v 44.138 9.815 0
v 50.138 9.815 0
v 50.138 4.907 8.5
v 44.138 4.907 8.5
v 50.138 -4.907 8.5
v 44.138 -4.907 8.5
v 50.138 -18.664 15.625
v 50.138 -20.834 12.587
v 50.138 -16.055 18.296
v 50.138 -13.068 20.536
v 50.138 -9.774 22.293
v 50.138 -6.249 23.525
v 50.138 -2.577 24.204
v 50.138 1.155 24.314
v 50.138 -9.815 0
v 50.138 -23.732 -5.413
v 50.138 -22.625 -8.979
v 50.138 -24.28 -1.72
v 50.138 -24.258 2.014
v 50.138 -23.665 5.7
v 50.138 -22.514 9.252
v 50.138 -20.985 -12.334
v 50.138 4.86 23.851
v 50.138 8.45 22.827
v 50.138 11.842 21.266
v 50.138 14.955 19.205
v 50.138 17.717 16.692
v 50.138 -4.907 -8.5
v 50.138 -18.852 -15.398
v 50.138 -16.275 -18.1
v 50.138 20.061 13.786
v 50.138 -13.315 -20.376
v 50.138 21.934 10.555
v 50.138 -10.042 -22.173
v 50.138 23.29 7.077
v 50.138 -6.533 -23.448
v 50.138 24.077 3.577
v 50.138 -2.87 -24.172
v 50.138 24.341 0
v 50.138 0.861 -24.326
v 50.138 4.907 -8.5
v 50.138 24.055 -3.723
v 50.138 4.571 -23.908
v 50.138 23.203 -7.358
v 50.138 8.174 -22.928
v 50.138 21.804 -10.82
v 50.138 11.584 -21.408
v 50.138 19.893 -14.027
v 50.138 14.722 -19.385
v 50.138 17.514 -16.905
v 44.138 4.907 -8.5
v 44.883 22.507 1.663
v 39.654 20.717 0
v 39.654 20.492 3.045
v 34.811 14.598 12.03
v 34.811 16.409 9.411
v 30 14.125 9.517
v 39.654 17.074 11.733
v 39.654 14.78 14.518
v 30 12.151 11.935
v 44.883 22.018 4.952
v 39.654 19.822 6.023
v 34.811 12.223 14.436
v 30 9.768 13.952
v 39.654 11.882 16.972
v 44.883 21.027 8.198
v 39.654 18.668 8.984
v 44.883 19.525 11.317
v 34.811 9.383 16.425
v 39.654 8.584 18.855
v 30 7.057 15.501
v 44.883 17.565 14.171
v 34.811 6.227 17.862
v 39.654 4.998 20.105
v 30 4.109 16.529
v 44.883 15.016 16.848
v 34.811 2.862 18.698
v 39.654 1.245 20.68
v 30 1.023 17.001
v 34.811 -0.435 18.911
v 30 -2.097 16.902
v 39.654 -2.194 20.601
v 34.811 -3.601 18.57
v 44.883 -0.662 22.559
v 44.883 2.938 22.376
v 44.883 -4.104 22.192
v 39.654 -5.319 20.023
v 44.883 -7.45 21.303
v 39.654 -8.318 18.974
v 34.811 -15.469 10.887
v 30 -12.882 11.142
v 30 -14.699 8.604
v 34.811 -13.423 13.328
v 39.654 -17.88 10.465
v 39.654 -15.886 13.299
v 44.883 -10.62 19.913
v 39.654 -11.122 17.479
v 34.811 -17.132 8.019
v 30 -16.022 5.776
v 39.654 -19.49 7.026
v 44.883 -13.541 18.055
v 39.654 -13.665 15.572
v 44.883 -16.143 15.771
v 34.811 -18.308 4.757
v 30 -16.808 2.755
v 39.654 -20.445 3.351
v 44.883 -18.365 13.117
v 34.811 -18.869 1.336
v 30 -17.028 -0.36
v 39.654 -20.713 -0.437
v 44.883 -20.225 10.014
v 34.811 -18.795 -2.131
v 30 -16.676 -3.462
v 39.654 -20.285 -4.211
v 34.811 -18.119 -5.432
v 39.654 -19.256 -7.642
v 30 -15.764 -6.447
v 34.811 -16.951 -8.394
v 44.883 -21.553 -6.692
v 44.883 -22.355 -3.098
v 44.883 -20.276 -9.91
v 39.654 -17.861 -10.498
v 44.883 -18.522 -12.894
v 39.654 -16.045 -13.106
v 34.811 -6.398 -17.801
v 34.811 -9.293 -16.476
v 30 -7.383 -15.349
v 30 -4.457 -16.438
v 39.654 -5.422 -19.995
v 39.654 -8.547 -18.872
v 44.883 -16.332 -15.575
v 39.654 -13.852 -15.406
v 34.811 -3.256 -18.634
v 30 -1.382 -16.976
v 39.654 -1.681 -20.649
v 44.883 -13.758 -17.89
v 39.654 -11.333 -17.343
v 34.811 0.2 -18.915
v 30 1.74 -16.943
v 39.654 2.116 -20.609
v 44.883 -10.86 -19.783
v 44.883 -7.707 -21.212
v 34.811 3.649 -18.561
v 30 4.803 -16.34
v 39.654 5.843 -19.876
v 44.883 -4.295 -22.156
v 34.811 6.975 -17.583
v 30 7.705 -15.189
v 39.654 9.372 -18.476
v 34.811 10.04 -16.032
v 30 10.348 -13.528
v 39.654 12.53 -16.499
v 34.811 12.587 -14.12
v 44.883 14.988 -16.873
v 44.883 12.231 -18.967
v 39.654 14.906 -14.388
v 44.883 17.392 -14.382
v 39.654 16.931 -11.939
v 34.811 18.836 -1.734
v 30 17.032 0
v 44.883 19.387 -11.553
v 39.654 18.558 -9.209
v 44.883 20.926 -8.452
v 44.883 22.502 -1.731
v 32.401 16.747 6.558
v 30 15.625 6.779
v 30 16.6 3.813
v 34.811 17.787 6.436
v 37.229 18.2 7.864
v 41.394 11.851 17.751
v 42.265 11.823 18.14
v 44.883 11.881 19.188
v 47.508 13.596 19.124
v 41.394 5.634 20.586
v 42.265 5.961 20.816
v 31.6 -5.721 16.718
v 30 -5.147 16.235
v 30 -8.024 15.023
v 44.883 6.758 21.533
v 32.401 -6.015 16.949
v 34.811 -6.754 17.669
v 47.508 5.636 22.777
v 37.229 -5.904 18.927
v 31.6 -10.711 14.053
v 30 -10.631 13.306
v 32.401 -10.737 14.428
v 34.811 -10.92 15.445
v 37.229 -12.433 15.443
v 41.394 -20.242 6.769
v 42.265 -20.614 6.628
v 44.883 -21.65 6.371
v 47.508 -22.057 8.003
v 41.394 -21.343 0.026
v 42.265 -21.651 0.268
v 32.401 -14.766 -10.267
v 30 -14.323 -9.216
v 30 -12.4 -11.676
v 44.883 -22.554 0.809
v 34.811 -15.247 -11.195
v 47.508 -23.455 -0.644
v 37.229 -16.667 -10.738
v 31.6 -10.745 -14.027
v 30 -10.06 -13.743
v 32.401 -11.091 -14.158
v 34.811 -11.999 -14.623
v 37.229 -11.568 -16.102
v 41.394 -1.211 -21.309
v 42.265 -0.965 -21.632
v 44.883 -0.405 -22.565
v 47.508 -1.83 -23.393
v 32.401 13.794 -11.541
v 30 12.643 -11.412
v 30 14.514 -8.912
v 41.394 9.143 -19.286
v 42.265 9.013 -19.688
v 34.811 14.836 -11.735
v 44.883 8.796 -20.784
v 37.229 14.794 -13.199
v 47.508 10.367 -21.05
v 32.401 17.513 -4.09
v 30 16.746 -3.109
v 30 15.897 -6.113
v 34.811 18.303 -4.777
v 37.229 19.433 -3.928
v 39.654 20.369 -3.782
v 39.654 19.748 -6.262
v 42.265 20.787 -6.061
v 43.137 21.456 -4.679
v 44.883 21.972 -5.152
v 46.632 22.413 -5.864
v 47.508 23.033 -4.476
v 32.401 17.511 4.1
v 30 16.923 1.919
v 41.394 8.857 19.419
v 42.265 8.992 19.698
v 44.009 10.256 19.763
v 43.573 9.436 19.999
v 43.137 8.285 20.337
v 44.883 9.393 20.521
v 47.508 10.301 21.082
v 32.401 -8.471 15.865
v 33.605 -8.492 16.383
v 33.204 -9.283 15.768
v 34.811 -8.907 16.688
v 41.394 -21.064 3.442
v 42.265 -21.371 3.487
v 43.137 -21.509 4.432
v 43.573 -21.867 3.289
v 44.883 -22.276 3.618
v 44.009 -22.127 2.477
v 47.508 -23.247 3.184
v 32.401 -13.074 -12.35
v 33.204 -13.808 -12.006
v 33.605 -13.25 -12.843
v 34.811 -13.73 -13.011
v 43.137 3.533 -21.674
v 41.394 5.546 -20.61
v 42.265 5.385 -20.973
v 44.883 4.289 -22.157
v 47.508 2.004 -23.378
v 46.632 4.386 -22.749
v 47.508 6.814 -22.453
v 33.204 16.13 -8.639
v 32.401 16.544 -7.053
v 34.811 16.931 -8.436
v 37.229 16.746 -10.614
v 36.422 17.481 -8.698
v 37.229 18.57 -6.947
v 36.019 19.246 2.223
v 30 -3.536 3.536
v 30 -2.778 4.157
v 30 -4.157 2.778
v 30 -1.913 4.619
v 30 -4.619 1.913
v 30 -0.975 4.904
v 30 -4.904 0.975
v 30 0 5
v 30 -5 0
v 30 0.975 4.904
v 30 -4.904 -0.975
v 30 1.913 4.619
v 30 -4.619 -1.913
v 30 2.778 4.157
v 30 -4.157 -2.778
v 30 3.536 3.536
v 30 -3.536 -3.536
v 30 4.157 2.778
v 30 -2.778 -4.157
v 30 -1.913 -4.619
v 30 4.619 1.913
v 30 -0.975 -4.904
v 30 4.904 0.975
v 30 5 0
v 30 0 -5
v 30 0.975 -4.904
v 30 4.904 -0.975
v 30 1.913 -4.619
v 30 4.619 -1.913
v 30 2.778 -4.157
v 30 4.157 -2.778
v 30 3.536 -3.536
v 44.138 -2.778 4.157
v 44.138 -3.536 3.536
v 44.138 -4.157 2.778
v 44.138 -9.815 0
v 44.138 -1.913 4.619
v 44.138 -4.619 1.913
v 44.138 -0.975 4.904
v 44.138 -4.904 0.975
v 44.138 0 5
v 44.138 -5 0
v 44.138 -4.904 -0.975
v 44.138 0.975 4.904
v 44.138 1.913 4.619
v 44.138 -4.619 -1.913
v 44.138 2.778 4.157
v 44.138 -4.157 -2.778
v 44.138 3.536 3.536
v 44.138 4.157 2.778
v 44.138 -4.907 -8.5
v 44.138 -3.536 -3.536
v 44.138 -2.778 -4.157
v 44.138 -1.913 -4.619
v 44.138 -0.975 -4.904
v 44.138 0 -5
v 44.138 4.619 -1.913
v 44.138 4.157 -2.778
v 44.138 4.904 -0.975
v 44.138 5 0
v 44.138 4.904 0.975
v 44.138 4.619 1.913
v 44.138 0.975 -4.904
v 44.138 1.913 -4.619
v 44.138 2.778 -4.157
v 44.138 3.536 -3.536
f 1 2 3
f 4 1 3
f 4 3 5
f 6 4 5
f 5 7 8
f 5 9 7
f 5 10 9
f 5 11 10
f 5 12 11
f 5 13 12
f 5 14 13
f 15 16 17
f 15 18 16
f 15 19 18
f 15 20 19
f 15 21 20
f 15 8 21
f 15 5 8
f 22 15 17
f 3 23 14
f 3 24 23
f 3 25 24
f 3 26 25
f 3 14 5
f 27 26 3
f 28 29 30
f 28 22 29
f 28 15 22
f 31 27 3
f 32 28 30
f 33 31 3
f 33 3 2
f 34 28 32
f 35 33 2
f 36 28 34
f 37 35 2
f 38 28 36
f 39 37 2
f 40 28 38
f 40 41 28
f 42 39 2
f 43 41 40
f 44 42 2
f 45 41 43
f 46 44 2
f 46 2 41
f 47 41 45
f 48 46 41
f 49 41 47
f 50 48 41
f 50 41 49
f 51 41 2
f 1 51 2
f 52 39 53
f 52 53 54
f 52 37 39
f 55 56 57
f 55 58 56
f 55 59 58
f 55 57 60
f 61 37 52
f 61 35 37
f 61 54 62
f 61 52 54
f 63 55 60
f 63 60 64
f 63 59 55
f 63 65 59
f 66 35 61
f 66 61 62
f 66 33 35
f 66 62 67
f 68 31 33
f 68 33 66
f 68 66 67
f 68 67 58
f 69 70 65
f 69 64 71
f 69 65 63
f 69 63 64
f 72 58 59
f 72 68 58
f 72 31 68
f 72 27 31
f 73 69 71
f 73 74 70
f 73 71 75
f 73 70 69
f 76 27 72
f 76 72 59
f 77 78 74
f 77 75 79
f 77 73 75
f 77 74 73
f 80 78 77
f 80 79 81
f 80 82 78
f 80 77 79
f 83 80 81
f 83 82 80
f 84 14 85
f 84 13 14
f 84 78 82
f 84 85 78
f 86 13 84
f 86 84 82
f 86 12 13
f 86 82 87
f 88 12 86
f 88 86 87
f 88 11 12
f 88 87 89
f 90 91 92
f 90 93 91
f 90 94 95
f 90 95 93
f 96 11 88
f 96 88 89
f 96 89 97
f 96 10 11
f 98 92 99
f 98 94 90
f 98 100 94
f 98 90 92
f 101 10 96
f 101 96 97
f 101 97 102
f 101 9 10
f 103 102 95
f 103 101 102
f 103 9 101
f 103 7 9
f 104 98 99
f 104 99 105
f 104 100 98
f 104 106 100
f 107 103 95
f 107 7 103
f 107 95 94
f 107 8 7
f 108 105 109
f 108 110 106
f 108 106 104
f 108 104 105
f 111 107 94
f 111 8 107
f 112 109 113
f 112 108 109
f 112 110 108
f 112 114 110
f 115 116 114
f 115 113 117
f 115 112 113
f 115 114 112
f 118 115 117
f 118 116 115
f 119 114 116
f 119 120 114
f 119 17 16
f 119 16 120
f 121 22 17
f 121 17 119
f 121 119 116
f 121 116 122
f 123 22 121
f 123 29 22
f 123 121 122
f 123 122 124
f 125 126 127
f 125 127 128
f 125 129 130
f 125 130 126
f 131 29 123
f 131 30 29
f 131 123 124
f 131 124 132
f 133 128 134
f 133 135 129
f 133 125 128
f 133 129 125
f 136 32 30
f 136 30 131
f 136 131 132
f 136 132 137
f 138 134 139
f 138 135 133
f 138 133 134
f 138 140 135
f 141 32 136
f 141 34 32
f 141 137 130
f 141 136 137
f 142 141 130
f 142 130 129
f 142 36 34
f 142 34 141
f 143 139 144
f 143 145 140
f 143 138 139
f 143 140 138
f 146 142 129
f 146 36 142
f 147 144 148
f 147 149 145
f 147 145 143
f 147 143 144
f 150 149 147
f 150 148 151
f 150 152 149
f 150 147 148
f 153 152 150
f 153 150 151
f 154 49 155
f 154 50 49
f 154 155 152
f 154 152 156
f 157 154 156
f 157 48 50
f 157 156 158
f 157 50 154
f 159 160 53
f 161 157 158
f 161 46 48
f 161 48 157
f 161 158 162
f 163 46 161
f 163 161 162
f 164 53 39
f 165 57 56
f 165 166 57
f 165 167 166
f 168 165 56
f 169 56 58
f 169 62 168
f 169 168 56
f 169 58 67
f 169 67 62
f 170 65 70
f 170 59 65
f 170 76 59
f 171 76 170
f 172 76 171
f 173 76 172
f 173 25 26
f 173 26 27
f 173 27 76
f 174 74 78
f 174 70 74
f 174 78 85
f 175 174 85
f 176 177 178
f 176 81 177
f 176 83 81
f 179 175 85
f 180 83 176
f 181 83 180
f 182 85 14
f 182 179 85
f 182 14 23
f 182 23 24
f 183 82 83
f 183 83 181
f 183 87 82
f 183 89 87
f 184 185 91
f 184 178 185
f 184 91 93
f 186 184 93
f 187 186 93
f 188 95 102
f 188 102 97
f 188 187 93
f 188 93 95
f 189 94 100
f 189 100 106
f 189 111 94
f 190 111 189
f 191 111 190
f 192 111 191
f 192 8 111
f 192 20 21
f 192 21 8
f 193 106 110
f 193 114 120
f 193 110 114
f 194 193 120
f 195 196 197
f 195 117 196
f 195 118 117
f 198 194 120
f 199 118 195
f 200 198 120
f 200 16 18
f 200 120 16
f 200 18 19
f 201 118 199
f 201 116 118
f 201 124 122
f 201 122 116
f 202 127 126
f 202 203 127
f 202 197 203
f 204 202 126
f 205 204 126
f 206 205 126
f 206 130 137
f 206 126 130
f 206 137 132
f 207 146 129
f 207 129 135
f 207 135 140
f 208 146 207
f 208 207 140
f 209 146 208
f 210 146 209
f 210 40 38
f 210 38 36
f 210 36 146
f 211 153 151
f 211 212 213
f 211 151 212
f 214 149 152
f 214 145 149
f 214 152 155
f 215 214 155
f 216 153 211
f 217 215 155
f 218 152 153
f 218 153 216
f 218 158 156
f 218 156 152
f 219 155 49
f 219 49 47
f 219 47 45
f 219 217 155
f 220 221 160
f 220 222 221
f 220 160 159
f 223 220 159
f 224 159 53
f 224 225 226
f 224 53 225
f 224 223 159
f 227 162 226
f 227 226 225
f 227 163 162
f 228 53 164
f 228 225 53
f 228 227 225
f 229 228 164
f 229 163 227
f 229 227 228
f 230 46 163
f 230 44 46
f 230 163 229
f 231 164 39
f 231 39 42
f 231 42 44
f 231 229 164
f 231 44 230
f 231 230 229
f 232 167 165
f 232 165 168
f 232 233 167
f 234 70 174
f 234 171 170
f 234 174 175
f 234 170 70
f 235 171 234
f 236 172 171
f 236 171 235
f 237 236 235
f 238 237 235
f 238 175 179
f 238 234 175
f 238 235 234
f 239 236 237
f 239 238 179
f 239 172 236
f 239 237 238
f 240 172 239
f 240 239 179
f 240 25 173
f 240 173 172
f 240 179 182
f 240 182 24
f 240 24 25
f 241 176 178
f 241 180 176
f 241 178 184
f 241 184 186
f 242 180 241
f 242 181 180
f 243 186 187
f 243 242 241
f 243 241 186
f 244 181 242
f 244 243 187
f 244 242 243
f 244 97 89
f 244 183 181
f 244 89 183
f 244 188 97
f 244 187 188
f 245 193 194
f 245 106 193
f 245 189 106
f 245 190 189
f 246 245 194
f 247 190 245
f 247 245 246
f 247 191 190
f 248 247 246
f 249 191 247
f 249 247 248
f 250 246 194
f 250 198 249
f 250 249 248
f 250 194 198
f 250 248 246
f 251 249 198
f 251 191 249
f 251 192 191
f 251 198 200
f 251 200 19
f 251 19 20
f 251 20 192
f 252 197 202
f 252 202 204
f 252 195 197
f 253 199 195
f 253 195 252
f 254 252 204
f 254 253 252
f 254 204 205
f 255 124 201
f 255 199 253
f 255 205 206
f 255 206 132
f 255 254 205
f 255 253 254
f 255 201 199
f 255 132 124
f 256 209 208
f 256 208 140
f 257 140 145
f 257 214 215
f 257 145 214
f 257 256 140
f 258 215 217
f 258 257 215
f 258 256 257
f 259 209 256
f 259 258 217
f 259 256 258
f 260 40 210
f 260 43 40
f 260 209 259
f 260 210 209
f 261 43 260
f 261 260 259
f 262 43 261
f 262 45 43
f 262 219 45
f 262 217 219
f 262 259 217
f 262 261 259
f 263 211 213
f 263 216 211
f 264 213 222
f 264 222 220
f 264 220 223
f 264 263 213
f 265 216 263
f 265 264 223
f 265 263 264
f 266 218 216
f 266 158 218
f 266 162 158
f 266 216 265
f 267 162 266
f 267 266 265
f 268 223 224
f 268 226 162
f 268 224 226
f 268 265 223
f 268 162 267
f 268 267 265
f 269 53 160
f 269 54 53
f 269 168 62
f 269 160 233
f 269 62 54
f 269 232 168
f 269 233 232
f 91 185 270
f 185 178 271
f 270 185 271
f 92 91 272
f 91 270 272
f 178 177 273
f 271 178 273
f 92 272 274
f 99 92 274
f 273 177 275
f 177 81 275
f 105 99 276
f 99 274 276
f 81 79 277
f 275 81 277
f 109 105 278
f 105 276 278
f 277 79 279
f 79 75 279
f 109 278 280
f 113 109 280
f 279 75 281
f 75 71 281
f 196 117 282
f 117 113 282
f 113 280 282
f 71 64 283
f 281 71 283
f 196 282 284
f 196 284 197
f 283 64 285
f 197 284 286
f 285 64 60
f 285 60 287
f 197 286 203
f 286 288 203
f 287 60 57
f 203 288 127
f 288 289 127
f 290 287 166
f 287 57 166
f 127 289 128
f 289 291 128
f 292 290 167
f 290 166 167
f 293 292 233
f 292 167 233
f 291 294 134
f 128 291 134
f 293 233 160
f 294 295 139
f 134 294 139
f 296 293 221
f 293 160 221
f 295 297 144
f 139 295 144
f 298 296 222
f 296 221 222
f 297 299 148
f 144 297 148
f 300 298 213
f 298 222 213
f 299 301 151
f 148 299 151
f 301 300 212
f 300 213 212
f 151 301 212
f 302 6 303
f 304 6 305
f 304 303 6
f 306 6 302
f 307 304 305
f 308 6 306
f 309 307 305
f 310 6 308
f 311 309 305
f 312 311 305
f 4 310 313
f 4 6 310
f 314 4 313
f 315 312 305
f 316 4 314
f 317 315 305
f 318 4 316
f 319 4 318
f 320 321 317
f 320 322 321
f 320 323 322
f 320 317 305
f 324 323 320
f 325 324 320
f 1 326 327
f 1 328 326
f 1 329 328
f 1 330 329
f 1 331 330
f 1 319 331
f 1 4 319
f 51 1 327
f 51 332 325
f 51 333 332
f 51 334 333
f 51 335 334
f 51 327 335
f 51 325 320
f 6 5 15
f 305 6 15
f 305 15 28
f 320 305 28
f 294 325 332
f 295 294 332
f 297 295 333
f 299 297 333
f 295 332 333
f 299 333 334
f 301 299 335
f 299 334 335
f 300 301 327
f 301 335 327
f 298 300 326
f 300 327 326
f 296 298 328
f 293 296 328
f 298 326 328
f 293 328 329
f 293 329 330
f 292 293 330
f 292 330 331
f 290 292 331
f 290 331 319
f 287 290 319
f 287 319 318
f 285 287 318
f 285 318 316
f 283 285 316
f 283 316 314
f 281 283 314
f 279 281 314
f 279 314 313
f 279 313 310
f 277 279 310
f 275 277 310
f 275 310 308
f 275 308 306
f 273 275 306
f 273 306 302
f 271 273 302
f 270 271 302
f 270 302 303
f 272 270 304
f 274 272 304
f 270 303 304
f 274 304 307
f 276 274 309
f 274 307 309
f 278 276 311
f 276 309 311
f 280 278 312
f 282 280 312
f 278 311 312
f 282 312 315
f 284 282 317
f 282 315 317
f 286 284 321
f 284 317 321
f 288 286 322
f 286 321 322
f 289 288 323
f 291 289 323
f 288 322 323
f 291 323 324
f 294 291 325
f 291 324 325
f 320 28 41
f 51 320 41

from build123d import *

# Parameters (mm, degrees)
SKIZZE4_R                            = 60
SCHNITT_LINEAR_AUSTRAGEN2_DEPTH      = 30
SKIZZE7_R                            = 100
SCHNITT_LINEAR_AUSTRAGEN4_DEPTH      = 270
SCHNITT_LINEAR_AUSTRAGEN3_DEPTH      = 20
SCHNITT_LINEAR_AUSTRAGEN3_DEPTH_BACK = 6
SKIZZE8_R                            = 5
SCHNITT_LINEAR_AUSTRAGEN5_DEPTH      = 15.138486988


with BuildPart() as part:
    # Skizze2 → Rotation1 (revolve)
    with BuildSketch(Plane.XY):
        with BuildLine():
            add(Edge.make_bspline(
                [(0, 0), (0.001795611, 0.01152954), (0.006532552, 0.034308256), (0.020814366, 0.078703922), (0.056576906, 0.164791889), (0.106248222, 0.260720398), (0.168831035, 0.366307006), (0.257283092, 0.501671411), (0.394318593, 0.693561073), (0.642308836, 1.002302903), (1.094138817, 1.494661034), (1.881119362, 2.241604858), (3.222990514, 3.351501836), (5.484884156, 4.977799832), (9.131242119, 7.255827512), (14.921132384, 10.401183749), (22.887129803, 14.153969102), (35.107137362, 19.201527382), (51.190688574, 24.887218377), (70.271426107, 30.664808891), (92.146031821, 36.297901472), (114.202164386, 41.163847082), (136.396259571, 45.35267271), (158.696515923, 48.929230891), (181.079729625, 51.941229812), (203.527006462, 54.42802234), (226.023091403, 56.423318789), (248.554958993, 57.959192165), (271.111661384, 59.068213328), (291.830400074, 59.728200821), (306.910887079, 60.003248255), (316.347321901, 60.107131137), (320.138486888, 60.138935837)],
                knots=[0, 0, 0, 0, 0, 0.000129466, 0.000258932, 0.000517865, 0.001035729, 0.001329598, 0.001623466, 0.002316092, 0.003657337, 0.005731188, 0.00905026, 0.014374967, 0.023011204, 0.036694212, 0.056839005, 0.087619321, 0.120902055, 0.183694742, 0.246487462, 0.309280168, 0.372072878, 0.43486559, 0.497658301, 0.560451012, 0.623243722, 0.686036437, 0.748829149, 0.811621861, 0.874414574, 0.916582404, 0.916582404, 0.916582404, 0.916582404, 0.916582404], degree=4))
            Line((0, 0), (320.138486888, 0))
            Line((320.138486888, 0), (320.138486888, 60.138935837))
        make_face()
    revolve(axis=Axis((0, 0, 0), (1, 0, 0)))

    # Skizze4 → Schnitt-Linear austragen2 (cut)
    with BuildSketch(Plane(origin=(0, 0, 0), x_dir=(0, 0, -1), z_dir=(1, 0, 0))):
        Circle(SKIZZE4_R)
    extrude(amount=SCHNITT_LINEAR_AUSTRAGEN2_DEPTH, mode=Mode.SUBTRACT)

    # Skizze7 → Schnitt-Linear austragen4 (cut)
    with BuildSketch(Plane(origin=(320.138486888, 0, 0), x_dir=(0, 0, -1), z_dir=(1, 0, 0))):
        Circle(SKIZZE7_R)
    extrude(amount=-SCHNITT_LINEAR_AUSTRAGEN4_DEPTH, mode=Mode.SUBTRACT)

    # Skizze6 → Schnitt-Linear austragen3 (cut, two sides)
    with BuildSketch(Plane(origin=(50.138486888, 0, 0), x_dir=(0, 0, -1), z_dir=(1, 0, 0))) as schnitt_linear_austragen3_sk:
        Polygon((0, -9.814954576), (8.5, -4.907477288), (8.5, 4.907477288), (0, 9.814954576), (-8.5, 4.907477288), (-8.5, -4.907477288), align=None)
    extrude(amount=SCHNITT_LINEAR_AUSTRAGEN3_DEPTH, mode=Mode.SUBTRACT)
    extrude(schnitt_linear_austragen3_sk.sketch, amount=-SCHNITT_LINEAR_AUSTRAGEN3_DEPTH_BACK, mode=Mode.SUBTRACT)

    # Skizze8 → Schnitt-Linear austragen5 (cut, through all)
    with BuildSketch(Plane(origin=(44.138486888, 0, 0), x_dir=(0, 0, -1), z_dir=(1, 0, 0))):
        Circle(SKIZZE8_R)
    extrude(amount=-SCHNITT_LINEAR_AUSTRAGEN5_DEPTH, mode=Mode.SUBTRACT)


solid = part.part
